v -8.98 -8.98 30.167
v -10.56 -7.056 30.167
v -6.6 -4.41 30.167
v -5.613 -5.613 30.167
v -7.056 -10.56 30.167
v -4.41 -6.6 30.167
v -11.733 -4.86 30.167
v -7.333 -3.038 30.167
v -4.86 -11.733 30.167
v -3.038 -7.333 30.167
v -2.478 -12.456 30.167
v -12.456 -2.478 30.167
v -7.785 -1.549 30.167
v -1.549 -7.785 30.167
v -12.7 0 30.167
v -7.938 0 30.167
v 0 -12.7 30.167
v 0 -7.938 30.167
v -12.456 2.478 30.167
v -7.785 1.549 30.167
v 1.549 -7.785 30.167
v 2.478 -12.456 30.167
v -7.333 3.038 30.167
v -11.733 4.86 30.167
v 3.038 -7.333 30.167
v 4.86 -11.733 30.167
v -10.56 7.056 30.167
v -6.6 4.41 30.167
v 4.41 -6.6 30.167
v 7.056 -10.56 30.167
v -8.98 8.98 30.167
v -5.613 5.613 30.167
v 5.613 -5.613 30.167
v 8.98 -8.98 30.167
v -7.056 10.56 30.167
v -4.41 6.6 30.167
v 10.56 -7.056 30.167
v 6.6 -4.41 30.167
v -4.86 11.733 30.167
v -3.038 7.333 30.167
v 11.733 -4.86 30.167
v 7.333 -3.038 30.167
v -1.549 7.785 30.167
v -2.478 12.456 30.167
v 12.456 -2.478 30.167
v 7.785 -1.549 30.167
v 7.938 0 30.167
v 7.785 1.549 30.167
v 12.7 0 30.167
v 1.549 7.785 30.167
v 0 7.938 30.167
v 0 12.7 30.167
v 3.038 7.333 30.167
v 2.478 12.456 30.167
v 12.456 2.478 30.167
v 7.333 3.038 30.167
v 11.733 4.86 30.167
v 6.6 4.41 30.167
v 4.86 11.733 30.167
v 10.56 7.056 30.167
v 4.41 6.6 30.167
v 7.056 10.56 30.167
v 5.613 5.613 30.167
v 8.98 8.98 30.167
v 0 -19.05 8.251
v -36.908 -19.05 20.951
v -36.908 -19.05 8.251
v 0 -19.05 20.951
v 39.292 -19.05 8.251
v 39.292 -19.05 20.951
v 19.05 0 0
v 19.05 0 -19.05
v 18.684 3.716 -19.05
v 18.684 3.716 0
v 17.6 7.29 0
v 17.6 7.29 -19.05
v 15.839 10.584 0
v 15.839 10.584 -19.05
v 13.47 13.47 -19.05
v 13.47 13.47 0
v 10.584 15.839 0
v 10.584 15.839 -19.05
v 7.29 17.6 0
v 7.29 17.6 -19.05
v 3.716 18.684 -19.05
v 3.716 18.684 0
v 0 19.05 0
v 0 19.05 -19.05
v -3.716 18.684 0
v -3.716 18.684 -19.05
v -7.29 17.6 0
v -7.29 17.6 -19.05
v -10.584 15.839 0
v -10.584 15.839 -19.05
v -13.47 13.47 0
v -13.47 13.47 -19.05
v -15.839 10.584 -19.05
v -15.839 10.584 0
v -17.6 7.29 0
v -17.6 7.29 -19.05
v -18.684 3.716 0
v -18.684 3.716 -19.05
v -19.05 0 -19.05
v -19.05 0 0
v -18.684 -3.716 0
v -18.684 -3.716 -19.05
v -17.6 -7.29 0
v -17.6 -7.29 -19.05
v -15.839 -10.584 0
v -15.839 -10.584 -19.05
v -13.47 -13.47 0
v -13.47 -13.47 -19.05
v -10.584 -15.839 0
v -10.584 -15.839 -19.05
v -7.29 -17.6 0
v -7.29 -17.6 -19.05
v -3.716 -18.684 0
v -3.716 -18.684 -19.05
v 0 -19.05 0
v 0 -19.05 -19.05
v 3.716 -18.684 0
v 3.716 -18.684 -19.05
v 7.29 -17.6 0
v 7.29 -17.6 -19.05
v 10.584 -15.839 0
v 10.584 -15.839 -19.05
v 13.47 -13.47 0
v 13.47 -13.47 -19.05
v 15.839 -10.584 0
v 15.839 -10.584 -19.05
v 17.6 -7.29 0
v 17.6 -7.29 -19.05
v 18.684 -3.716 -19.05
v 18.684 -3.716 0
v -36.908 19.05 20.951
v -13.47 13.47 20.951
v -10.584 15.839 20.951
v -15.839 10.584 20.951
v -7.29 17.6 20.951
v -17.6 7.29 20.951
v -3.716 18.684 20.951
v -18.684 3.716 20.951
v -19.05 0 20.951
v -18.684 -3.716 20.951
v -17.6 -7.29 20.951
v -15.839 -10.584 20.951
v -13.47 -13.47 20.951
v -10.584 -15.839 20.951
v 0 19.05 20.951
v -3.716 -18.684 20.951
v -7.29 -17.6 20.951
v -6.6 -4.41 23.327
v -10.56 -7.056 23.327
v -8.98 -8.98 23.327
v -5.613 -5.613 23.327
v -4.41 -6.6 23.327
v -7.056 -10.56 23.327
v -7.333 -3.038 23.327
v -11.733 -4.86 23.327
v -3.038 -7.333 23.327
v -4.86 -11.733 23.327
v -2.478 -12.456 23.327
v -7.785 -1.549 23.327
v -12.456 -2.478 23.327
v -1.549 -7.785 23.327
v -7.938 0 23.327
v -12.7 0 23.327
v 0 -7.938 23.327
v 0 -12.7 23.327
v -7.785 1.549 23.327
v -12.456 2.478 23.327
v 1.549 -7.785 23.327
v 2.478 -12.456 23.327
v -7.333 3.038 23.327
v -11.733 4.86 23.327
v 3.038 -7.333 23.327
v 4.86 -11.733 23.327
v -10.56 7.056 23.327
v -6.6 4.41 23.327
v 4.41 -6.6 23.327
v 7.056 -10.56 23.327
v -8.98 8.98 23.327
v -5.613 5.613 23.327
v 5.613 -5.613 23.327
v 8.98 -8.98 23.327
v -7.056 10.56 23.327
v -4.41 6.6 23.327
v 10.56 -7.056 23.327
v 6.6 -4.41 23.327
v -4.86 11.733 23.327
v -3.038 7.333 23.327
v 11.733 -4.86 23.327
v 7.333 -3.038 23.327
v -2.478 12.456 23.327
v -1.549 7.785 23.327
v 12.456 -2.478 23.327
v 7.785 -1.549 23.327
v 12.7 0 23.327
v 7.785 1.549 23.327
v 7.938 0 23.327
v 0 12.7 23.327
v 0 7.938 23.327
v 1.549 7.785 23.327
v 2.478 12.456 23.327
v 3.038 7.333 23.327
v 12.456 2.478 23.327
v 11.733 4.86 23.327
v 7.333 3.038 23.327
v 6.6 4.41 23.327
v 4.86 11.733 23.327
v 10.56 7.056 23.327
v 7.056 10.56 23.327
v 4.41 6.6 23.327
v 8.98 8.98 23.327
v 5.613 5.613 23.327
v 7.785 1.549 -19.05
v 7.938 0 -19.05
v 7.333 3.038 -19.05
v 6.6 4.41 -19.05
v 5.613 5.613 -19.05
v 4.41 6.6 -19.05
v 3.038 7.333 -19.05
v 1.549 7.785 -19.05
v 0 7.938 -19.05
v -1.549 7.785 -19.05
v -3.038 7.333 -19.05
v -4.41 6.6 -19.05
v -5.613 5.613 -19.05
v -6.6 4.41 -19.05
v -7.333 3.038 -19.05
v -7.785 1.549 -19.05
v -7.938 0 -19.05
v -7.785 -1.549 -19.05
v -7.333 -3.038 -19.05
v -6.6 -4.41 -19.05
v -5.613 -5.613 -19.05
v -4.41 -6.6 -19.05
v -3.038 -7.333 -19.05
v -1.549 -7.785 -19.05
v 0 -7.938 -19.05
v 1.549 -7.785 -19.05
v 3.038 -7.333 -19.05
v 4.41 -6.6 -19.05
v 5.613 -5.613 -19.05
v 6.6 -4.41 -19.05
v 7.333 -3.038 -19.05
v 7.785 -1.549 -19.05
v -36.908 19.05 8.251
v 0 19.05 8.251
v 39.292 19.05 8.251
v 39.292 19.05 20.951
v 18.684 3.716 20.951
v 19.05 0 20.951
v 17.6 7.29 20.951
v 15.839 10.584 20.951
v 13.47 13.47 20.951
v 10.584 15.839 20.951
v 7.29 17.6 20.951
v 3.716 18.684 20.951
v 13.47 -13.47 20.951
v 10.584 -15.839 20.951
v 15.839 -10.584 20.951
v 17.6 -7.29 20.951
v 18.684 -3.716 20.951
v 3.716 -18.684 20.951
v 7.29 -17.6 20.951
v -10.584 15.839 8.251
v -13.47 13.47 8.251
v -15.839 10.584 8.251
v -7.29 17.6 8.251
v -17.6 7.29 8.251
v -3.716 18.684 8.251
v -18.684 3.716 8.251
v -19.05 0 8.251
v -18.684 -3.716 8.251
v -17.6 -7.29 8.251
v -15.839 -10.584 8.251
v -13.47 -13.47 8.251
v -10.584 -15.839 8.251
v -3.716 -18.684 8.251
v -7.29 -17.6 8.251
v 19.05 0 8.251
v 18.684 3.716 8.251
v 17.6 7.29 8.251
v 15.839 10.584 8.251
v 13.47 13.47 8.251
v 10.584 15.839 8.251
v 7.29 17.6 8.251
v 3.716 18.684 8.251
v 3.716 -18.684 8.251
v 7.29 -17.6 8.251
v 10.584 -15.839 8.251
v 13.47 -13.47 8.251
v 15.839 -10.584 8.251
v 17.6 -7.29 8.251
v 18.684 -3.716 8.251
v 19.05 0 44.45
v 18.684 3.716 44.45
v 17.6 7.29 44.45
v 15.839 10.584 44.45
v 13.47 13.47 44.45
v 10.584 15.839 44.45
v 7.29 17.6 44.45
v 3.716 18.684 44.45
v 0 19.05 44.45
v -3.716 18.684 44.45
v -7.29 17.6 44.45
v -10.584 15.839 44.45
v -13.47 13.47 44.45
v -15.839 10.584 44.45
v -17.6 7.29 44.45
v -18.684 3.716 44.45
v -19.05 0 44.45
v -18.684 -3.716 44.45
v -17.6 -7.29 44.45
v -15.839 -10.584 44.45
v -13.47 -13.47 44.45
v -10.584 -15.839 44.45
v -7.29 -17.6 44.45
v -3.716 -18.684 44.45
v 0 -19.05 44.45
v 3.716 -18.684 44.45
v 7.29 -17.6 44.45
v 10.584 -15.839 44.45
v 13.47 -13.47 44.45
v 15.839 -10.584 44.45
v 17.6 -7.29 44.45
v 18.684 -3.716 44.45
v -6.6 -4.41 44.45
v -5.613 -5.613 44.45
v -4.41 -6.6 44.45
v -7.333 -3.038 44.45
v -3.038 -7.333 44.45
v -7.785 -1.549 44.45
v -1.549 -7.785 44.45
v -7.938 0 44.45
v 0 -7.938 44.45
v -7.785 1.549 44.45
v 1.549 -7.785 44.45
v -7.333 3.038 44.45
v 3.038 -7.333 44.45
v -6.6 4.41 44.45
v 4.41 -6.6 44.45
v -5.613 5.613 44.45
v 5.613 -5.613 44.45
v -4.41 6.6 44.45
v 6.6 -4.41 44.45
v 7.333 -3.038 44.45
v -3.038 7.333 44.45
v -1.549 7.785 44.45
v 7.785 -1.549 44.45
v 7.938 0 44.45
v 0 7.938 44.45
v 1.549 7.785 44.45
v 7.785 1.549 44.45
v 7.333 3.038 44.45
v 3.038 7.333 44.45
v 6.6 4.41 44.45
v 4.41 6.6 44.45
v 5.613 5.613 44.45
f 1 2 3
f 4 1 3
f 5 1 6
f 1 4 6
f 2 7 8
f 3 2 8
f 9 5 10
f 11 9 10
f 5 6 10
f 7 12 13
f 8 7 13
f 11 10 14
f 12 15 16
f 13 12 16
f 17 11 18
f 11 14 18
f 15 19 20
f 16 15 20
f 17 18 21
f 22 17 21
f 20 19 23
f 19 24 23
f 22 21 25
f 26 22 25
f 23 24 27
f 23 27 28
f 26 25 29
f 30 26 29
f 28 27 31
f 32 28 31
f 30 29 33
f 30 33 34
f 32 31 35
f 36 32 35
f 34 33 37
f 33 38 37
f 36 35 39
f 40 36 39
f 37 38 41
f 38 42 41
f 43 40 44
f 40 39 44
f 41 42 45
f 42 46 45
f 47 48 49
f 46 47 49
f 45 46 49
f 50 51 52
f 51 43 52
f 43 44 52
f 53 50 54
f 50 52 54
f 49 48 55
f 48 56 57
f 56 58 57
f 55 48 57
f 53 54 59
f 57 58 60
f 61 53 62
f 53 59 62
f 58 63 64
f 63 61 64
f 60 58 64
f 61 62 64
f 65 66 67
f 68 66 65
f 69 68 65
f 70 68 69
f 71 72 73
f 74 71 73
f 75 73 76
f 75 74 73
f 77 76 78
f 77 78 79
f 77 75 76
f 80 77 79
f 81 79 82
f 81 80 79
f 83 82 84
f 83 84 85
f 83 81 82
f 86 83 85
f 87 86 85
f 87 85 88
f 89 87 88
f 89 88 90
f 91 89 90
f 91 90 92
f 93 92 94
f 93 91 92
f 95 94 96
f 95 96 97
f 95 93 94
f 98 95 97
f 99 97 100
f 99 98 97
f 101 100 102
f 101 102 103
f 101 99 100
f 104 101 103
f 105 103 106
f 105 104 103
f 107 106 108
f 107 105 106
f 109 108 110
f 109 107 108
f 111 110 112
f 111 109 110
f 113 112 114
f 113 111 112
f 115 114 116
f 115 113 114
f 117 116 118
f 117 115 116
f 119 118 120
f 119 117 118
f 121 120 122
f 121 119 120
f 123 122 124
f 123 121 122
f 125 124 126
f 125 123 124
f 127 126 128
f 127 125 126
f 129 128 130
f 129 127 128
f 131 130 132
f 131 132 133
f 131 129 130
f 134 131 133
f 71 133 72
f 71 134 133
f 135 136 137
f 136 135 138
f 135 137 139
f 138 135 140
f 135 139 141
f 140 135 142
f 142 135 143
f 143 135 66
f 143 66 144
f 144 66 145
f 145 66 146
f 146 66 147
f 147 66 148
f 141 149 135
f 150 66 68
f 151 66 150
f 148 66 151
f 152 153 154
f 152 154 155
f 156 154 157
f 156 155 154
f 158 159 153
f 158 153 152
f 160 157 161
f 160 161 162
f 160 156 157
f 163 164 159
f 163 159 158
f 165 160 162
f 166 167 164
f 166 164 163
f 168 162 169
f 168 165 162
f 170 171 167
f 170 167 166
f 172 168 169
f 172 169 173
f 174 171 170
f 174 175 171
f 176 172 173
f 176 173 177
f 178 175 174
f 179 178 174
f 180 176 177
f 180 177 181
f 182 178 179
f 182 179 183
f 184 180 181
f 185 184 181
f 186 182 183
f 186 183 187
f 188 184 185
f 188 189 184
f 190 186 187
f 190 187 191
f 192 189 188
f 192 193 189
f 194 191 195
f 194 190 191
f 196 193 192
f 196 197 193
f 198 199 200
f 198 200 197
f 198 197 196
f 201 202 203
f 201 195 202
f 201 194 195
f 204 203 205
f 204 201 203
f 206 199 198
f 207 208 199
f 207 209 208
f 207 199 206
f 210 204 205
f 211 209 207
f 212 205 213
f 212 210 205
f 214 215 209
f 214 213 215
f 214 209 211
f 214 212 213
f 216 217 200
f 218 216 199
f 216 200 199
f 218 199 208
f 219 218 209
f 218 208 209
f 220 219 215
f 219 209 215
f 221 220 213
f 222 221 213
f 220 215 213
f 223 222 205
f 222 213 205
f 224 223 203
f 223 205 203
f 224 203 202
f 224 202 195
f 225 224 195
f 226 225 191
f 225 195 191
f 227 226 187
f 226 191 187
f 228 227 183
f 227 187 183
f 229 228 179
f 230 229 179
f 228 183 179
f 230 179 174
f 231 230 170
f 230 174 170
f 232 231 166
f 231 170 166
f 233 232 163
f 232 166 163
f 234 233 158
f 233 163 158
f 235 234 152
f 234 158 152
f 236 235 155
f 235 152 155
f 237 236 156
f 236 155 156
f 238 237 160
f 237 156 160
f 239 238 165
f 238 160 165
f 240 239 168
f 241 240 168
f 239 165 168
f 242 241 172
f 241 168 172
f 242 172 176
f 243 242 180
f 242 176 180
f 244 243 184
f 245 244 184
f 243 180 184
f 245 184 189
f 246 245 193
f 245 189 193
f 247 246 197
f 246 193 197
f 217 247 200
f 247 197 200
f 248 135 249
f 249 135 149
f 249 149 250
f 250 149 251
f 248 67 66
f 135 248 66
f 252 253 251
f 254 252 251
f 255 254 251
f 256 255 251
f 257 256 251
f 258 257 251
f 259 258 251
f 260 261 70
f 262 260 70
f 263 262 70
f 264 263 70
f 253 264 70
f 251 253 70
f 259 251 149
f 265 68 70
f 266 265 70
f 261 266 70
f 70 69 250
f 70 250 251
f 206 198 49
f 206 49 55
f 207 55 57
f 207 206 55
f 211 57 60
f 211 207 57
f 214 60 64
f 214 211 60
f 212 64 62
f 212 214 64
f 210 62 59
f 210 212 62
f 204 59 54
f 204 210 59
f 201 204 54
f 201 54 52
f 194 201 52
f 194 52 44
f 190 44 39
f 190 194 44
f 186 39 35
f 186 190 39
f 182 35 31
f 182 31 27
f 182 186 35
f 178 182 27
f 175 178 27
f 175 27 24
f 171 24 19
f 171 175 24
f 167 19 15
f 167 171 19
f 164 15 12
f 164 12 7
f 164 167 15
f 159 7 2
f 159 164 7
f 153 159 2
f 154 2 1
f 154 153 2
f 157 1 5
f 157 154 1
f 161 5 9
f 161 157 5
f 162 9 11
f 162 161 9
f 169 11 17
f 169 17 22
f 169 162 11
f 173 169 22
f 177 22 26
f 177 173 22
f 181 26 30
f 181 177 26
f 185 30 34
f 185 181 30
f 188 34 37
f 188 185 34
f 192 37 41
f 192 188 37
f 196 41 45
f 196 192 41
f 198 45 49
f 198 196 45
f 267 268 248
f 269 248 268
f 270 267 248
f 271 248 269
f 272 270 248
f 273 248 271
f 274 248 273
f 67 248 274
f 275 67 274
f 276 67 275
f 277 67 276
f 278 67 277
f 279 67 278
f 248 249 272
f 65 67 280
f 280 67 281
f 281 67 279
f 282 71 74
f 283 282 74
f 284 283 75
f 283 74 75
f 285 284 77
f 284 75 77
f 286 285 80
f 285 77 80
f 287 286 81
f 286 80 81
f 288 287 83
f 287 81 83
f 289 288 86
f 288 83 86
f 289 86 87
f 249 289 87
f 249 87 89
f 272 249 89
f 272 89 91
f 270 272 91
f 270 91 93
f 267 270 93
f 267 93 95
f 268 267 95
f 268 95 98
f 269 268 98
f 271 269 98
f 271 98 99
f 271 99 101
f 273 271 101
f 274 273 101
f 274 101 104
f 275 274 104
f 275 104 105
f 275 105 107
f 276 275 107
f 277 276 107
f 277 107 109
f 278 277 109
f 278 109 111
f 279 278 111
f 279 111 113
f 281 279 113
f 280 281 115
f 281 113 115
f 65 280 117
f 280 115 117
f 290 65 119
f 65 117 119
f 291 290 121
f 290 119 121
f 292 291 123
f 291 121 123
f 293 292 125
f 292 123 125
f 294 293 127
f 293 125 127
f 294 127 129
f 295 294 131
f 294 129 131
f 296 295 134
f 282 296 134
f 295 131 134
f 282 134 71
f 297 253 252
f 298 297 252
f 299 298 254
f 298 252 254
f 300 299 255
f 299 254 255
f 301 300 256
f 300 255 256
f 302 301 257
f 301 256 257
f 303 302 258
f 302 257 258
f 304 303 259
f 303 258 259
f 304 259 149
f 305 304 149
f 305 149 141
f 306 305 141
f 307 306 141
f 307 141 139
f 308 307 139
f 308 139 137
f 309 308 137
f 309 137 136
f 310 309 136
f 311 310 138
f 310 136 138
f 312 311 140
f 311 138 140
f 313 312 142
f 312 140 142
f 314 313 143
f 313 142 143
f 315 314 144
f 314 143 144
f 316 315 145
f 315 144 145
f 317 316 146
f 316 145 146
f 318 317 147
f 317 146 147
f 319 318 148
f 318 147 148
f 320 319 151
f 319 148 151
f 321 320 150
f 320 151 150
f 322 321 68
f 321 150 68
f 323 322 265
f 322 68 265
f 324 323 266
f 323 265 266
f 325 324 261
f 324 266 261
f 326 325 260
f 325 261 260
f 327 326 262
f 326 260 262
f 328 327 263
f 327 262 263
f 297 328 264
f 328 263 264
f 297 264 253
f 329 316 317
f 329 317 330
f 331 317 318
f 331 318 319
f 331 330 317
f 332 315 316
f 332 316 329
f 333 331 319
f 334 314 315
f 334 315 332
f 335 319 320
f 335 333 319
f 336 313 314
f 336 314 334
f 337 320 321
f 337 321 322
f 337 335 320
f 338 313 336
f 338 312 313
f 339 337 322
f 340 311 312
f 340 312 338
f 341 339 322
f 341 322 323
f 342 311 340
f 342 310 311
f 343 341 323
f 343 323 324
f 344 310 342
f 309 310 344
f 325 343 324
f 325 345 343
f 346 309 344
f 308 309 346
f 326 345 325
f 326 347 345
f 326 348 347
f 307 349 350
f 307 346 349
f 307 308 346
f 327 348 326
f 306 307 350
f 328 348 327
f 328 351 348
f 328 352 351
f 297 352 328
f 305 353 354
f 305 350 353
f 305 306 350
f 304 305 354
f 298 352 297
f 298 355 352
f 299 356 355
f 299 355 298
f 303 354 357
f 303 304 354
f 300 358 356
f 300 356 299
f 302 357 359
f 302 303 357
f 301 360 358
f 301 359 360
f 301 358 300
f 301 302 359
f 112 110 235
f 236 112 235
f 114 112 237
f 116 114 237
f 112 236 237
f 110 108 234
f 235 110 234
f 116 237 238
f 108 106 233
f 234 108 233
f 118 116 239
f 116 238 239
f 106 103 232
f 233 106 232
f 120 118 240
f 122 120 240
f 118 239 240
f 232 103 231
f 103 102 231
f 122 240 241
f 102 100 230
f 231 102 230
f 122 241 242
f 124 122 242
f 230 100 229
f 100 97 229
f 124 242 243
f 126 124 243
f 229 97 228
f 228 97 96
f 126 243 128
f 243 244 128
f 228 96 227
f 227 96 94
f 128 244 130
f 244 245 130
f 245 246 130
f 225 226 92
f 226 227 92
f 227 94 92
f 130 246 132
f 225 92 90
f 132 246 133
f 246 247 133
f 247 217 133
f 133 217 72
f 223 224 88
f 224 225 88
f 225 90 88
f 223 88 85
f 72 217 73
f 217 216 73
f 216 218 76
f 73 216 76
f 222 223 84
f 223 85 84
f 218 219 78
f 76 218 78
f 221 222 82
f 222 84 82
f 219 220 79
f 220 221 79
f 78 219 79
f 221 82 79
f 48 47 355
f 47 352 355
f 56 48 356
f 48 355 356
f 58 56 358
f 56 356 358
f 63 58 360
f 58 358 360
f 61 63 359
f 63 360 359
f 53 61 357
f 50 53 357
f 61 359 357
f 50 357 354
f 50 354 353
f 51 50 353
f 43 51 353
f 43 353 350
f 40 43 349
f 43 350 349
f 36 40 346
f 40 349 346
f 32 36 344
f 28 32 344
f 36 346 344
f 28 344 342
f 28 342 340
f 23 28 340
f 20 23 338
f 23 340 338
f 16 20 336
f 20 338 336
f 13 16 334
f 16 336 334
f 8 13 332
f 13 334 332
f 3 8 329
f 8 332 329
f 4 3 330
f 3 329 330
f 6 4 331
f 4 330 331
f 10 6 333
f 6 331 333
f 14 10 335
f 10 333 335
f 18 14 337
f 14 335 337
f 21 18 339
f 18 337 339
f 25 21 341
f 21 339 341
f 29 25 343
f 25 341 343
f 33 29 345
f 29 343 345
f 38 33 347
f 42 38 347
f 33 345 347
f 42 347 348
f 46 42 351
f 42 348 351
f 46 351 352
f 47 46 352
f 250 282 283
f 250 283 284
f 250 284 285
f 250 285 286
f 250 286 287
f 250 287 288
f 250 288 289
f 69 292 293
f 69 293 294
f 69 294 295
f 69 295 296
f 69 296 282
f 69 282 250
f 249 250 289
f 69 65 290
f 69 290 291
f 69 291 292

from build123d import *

# Parameters (mm, degrees)
F0_W          = 76.2
F0_H          = 12.7
F1_DEPTH      = 19.05
F2_R          = 19.05
F3_DEPTH      = 19.05
F3_DEPTH_BACK = 8.2509537059
F4_START      = 20.9509537059
F4_DEPTH      = 23.4990462941
F5_R          = 7.9375
F6_DEPTH      = 101.6
F8_START      = 23.32678
F7_R          = 12.7
F8_DEPTH      = 6.84063


with BuildPart() as f1:
    # F0 (on Front) → F1 (new body, symmetric)
    with BuildSketch(Plane.XZ):
        with Locations((1.1919587851, 14.6009537059)):
            Rectangle(F0_W, F0_H)
    extrude(amount=F1_DEPTH, both=True)

    # F2 (on Top) → F3 (join, two sides)
    with BuildSketch(Plane.XY) as f3_sk:
        Circle(F2_R)
    extrude(amount=-F3_DEPTH)
    extrude(f3_sk.sketch, amount=F3_DEPTH_BACK)

    # F2 (on Top) → F4 (join)
    with BuildSketch(Plane.XY.offset(F4_START)):
        Circle(F2_R)
    extrude(amount=F4_DEPTH)

    # F5 (on Top) → F6 (cut, symmetric)
    with BuildSketch(Plane.XY):
        Circle(F5_R)
    extrude(amount=F6_DEPTH, both=True, mode=Mode.SUBTRACT)

    # F7 (on Top) → F8 (cut)
    with BuildSketch(Plane.XY.offset(F8_START)):
        Circle(F7_R)
    extrude(amount=F8_DEPTH, mode=Mode.SUBTRACT)


solid = f1.part
